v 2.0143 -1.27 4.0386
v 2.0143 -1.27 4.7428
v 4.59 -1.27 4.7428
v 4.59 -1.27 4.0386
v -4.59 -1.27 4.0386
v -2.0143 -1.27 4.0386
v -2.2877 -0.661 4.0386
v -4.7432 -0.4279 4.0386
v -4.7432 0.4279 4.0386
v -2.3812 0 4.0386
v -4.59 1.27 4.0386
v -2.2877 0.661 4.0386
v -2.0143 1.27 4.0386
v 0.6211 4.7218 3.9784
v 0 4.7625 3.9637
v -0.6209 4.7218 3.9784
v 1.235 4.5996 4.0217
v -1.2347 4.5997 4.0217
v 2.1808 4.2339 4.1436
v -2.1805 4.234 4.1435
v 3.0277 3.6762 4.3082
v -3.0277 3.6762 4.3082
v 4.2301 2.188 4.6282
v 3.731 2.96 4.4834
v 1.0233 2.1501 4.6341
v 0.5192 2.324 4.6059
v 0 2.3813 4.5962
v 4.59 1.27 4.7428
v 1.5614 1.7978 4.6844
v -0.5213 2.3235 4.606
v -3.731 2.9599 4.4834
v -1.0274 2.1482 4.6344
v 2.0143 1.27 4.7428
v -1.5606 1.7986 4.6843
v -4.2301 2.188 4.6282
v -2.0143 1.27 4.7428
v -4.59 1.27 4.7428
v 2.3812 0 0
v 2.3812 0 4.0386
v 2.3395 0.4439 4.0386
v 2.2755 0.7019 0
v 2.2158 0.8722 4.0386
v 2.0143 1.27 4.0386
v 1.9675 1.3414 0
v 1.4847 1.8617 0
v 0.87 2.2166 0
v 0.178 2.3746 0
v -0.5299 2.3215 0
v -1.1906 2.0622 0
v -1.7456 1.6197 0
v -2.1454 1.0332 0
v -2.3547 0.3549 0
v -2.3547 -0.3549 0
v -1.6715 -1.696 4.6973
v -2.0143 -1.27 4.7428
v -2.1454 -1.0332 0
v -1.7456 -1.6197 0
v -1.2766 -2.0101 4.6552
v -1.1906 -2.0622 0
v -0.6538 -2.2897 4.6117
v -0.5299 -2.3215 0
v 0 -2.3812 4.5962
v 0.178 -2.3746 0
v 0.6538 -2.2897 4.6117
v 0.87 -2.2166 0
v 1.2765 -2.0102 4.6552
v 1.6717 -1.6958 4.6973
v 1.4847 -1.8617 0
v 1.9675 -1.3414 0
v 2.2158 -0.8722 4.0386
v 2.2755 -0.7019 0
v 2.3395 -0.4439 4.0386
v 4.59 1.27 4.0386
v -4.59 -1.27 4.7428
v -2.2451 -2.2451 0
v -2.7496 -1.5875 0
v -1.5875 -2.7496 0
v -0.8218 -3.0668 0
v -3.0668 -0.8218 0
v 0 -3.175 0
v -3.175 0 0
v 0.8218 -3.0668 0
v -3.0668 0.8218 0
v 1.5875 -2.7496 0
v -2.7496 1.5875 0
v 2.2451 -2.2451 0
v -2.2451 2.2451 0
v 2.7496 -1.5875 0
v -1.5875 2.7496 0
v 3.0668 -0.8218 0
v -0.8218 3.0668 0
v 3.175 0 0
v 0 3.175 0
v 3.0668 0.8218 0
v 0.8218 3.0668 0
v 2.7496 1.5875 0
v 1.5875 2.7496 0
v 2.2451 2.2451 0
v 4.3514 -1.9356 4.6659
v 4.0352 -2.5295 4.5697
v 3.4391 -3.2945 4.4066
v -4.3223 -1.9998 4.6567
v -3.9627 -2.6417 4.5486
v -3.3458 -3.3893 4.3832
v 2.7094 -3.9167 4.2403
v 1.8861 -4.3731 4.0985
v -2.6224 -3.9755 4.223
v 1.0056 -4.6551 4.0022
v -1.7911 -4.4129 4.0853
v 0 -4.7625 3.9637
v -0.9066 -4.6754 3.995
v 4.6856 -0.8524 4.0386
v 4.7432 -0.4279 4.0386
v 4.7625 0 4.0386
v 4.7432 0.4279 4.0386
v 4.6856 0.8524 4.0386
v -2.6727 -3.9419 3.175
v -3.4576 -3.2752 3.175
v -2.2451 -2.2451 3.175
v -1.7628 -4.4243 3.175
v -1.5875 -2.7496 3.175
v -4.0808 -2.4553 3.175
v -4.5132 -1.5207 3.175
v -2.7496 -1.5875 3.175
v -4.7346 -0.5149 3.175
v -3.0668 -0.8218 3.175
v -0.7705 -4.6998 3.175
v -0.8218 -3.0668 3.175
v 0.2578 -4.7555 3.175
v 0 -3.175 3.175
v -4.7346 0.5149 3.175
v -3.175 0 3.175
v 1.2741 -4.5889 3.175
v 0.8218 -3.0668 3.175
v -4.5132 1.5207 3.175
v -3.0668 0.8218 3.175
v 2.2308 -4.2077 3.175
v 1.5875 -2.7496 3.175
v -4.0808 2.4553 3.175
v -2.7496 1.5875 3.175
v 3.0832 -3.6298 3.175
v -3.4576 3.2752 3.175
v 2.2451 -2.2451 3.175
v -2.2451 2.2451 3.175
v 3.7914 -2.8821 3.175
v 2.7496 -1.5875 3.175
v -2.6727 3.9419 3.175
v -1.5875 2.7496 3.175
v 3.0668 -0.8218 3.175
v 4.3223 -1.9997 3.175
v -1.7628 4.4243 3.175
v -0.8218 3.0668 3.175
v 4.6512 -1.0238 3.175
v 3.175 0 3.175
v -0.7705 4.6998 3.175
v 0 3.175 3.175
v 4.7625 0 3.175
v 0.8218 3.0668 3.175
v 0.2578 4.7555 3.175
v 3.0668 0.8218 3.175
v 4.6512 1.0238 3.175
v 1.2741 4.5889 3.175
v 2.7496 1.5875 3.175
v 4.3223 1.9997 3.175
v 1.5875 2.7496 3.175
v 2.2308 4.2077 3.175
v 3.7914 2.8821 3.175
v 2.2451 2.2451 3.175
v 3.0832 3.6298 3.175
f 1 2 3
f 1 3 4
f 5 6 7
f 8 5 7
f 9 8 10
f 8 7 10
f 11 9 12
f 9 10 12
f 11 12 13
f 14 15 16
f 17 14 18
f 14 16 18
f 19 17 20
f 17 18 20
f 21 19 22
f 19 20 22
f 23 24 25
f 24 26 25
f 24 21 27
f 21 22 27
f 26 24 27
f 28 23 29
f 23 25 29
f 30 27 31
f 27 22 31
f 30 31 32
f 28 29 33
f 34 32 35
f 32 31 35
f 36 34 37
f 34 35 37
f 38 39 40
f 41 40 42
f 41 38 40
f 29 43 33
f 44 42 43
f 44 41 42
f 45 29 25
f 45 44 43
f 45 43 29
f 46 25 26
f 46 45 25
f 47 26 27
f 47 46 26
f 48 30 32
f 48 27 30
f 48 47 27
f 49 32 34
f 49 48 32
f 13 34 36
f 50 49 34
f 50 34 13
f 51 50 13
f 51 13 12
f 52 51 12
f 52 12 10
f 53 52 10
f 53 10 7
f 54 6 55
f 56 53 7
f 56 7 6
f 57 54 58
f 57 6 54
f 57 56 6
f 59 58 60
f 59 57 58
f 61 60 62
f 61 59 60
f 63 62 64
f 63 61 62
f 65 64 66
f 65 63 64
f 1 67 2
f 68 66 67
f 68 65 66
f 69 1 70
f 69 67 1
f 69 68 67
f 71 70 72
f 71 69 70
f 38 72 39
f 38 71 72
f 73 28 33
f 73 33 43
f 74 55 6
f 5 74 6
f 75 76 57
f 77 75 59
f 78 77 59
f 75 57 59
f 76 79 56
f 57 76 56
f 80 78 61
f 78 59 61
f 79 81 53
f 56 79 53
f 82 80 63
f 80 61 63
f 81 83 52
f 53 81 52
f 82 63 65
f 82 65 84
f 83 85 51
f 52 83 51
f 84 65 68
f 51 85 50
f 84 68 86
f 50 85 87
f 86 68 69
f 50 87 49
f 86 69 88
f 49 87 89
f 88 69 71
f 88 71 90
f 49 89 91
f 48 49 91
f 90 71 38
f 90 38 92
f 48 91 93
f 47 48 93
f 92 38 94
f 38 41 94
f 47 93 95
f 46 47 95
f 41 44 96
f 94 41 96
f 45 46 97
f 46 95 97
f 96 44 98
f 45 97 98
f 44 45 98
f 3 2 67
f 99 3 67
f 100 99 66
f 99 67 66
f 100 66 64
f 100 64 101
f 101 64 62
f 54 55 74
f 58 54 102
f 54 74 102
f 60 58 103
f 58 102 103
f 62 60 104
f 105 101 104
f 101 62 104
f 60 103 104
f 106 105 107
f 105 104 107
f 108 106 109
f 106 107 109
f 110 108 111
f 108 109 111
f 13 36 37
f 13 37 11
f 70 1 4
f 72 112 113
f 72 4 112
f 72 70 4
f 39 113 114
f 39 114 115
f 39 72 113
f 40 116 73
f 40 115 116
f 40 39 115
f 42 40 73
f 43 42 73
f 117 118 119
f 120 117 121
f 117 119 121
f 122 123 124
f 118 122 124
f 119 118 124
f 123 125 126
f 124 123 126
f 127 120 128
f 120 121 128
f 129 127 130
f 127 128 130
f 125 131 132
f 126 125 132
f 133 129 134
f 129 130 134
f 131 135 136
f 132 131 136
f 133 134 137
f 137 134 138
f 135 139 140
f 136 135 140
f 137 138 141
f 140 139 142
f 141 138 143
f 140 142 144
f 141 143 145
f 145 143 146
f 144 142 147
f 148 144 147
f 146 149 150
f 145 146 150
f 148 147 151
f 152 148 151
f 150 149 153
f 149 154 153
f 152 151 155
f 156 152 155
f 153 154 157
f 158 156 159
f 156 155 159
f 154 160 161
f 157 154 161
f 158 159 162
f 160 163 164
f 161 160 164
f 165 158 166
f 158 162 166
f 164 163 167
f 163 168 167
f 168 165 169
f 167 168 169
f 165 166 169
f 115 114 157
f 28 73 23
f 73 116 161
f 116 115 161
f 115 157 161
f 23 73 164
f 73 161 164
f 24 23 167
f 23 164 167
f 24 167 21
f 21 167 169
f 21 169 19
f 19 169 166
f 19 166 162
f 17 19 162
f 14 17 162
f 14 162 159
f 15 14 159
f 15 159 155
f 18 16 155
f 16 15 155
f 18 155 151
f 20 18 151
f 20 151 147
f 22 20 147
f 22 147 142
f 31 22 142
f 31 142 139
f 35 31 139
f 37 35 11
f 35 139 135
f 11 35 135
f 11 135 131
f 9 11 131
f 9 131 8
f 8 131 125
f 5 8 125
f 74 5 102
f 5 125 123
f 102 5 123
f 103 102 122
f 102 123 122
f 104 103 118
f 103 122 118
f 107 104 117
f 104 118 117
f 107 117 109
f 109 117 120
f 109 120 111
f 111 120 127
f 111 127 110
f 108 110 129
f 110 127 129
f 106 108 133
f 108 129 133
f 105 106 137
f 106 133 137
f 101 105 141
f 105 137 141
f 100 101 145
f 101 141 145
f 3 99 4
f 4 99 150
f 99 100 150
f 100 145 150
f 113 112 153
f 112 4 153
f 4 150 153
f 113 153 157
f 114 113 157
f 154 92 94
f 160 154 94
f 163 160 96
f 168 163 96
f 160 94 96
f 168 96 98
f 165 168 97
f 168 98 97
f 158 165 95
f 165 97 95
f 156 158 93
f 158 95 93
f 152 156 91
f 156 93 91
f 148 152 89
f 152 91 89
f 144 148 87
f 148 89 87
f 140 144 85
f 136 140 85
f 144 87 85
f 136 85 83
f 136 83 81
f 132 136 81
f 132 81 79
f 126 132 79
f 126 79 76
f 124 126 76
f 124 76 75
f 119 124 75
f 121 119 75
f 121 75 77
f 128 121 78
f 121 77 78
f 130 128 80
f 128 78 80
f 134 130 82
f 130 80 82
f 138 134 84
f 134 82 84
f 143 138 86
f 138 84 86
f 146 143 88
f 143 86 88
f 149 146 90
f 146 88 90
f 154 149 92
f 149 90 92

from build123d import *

# Parameters (mm, degrees)
SKETCH1_R               = 3.175
SKETCH1_R_2             = 2.38125
BOSS_EXTRUDE1_DEPTH     = 3.175
SKETCH2_R               = 4.7625
SKETCH2_R_2             = 2.38125
BOSS_EXTRUDE2_DEPTH     = 1.6256
SKETCH3_R               = 22.361166229
SKETCH3_R_2             = 13.97
CUT_EXTRUDE1_DEPTH      = 5.7625
CUT_EXTRUDE1_DEPTH_BACK = 5.7625
SKETCH4_W               = 0.762
SKETCH4_H               = 2.54
CUT_EXTRUDE2_DEPTH      = 5.7625001
CUT_EXTRUDE2_DEPTH_BACK = 5.7625001


with BuildPart() as part:
    # Sketch1 → Boss-Extrude1 (new body)
    with BuildSketch(Plane.XY):
        Circle(SKETCH1_R)
        Circle(SKETCH1_R_2, mode=Mode.SUBTRACT)
    extrude(amount=BOSS_EXTRUDE1_DEPTH)

    # Sketch2 → Boss-Extrude2 (add)
    with BuildSketch(Plane.XY.offset(3.175)):
        Circle(SKETCH2_R)
        Circle(SKETCH2_R_2, mode=Mode.SUBTRACT)
    extrude(amount=BOSS_EXTRUDE2_DEPTH)

    # Sketch3 → Cut-Extrude1 (cut, two sides)
    with BuildSketch(Plane(origin=(0, 0, 0), x_dir=(0, 0, -1), z_dir=(1, 0, 0))) as cut_extrude1_sk:
        with Locations((9.1694, 0)):
            Circle(SKETCH3_R)
        with Locations((9.1694, 0)):
            Circle(SKETCH3_R_2, mode=Mode.SUBTRACT)
    extrude(amount=CUT_EXTRUDE1_DEPTH, mode=Mode.SUBTRACT)
    extrude(cut_extrude1_sk.sketch, amount=-CUT_EXTRUDE1_DEPTH_BACK, mode=Mode.SUBTRACT)

    # Sketch4 → Cut-Extrude2 (cut, two sides)
    with BuildSketch(Plane(origin=(0, 0, 0), x_dir=(0, 0, -1), z_dir=(1, 0, 0))) as cut_extrude2_sk:
        with Locations((-4.4196, 0)):
            Rectangle(SKETCH4_W, SKETCH4_H)
    extrude(amount=CUT_EXTRUDE2_DEPTH, mode=Mode.SUBTRACT)
    extrude(cut_extrude2_sk.sketch, amount=-CUT_EXTRUDE2_DEPTH_BACK, mode=Mode.SUBTRACT)


solid = part.part
